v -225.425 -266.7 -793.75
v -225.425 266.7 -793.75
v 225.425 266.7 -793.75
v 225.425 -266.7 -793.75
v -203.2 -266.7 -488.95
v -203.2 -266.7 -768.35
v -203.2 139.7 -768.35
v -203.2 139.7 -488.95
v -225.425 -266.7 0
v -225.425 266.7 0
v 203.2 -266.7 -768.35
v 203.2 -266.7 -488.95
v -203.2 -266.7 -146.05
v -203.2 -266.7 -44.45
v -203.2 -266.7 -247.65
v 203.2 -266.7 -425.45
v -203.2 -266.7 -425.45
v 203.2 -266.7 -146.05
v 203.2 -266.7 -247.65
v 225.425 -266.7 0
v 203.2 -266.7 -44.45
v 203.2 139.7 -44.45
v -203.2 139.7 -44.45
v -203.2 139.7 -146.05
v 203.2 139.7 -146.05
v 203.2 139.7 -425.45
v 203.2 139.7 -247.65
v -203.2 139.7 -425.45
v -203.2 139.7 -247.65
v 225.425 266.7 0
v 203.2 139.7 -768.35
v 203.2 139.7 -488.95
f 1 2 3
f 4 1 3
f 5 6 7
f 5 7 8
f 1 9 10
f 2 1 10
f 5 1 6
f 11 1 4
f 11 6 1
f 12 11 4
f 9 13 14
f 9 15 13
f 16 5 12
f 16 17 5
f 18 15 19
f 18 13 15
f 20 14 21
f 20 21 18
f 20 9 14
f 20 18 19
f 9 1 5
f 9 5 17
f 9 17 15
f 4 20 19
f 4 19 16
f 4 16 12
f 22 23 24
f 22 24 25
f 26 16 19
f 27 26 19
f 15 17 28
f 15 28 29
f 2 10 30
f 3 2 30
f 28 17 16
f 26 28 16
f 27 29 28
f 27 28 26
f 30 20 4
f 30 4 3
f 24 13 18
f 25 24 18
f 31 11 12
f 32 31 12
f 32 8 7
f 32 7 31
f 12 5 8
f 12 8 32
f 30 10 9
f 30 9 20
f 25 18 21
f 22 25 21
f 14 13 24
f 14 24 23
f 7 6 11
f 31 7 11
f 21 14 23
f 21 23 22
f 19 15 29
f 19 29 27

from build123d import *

# Parameters (mm, degrees)
F0_W     = 450.85
F0_H     = 533.4
F1_DEPTH = 793.75
F2_W     = 406.4
F2_H     = 101.6
F2_H_2   = 177.8
F2_H_3   = 279.4
F3_DEPTH = 406.4


# Not quite as in the source:
# - a feature names something its author has since deleted; it is built from what else it names


with BuildPart() as f1:
    # F0 (on Top) → F1 (new body)
    with BuildSketch(Plane.XY):
        Rectangle(F0_W, F0_H)
    extrude(amount=-F1_DEPTH)

    # F2 (on face) → F3 (cut)
    with BuildSketch(Plane.XZ.offset(266.7)):
        with Locations((0, -95.25)):
            Rectangle(F2_W, F2_H)
        with Locations((0, -336.55)):
            Rectangle(F2_W, F2_H_2)
        with Locations((0, -628.65)):
            Rectangle(F2_W, F2_H_3)
    extrude(amount=-F3_DEPTH, mode=Mode.SUBTRACT)


solid = f1.part
